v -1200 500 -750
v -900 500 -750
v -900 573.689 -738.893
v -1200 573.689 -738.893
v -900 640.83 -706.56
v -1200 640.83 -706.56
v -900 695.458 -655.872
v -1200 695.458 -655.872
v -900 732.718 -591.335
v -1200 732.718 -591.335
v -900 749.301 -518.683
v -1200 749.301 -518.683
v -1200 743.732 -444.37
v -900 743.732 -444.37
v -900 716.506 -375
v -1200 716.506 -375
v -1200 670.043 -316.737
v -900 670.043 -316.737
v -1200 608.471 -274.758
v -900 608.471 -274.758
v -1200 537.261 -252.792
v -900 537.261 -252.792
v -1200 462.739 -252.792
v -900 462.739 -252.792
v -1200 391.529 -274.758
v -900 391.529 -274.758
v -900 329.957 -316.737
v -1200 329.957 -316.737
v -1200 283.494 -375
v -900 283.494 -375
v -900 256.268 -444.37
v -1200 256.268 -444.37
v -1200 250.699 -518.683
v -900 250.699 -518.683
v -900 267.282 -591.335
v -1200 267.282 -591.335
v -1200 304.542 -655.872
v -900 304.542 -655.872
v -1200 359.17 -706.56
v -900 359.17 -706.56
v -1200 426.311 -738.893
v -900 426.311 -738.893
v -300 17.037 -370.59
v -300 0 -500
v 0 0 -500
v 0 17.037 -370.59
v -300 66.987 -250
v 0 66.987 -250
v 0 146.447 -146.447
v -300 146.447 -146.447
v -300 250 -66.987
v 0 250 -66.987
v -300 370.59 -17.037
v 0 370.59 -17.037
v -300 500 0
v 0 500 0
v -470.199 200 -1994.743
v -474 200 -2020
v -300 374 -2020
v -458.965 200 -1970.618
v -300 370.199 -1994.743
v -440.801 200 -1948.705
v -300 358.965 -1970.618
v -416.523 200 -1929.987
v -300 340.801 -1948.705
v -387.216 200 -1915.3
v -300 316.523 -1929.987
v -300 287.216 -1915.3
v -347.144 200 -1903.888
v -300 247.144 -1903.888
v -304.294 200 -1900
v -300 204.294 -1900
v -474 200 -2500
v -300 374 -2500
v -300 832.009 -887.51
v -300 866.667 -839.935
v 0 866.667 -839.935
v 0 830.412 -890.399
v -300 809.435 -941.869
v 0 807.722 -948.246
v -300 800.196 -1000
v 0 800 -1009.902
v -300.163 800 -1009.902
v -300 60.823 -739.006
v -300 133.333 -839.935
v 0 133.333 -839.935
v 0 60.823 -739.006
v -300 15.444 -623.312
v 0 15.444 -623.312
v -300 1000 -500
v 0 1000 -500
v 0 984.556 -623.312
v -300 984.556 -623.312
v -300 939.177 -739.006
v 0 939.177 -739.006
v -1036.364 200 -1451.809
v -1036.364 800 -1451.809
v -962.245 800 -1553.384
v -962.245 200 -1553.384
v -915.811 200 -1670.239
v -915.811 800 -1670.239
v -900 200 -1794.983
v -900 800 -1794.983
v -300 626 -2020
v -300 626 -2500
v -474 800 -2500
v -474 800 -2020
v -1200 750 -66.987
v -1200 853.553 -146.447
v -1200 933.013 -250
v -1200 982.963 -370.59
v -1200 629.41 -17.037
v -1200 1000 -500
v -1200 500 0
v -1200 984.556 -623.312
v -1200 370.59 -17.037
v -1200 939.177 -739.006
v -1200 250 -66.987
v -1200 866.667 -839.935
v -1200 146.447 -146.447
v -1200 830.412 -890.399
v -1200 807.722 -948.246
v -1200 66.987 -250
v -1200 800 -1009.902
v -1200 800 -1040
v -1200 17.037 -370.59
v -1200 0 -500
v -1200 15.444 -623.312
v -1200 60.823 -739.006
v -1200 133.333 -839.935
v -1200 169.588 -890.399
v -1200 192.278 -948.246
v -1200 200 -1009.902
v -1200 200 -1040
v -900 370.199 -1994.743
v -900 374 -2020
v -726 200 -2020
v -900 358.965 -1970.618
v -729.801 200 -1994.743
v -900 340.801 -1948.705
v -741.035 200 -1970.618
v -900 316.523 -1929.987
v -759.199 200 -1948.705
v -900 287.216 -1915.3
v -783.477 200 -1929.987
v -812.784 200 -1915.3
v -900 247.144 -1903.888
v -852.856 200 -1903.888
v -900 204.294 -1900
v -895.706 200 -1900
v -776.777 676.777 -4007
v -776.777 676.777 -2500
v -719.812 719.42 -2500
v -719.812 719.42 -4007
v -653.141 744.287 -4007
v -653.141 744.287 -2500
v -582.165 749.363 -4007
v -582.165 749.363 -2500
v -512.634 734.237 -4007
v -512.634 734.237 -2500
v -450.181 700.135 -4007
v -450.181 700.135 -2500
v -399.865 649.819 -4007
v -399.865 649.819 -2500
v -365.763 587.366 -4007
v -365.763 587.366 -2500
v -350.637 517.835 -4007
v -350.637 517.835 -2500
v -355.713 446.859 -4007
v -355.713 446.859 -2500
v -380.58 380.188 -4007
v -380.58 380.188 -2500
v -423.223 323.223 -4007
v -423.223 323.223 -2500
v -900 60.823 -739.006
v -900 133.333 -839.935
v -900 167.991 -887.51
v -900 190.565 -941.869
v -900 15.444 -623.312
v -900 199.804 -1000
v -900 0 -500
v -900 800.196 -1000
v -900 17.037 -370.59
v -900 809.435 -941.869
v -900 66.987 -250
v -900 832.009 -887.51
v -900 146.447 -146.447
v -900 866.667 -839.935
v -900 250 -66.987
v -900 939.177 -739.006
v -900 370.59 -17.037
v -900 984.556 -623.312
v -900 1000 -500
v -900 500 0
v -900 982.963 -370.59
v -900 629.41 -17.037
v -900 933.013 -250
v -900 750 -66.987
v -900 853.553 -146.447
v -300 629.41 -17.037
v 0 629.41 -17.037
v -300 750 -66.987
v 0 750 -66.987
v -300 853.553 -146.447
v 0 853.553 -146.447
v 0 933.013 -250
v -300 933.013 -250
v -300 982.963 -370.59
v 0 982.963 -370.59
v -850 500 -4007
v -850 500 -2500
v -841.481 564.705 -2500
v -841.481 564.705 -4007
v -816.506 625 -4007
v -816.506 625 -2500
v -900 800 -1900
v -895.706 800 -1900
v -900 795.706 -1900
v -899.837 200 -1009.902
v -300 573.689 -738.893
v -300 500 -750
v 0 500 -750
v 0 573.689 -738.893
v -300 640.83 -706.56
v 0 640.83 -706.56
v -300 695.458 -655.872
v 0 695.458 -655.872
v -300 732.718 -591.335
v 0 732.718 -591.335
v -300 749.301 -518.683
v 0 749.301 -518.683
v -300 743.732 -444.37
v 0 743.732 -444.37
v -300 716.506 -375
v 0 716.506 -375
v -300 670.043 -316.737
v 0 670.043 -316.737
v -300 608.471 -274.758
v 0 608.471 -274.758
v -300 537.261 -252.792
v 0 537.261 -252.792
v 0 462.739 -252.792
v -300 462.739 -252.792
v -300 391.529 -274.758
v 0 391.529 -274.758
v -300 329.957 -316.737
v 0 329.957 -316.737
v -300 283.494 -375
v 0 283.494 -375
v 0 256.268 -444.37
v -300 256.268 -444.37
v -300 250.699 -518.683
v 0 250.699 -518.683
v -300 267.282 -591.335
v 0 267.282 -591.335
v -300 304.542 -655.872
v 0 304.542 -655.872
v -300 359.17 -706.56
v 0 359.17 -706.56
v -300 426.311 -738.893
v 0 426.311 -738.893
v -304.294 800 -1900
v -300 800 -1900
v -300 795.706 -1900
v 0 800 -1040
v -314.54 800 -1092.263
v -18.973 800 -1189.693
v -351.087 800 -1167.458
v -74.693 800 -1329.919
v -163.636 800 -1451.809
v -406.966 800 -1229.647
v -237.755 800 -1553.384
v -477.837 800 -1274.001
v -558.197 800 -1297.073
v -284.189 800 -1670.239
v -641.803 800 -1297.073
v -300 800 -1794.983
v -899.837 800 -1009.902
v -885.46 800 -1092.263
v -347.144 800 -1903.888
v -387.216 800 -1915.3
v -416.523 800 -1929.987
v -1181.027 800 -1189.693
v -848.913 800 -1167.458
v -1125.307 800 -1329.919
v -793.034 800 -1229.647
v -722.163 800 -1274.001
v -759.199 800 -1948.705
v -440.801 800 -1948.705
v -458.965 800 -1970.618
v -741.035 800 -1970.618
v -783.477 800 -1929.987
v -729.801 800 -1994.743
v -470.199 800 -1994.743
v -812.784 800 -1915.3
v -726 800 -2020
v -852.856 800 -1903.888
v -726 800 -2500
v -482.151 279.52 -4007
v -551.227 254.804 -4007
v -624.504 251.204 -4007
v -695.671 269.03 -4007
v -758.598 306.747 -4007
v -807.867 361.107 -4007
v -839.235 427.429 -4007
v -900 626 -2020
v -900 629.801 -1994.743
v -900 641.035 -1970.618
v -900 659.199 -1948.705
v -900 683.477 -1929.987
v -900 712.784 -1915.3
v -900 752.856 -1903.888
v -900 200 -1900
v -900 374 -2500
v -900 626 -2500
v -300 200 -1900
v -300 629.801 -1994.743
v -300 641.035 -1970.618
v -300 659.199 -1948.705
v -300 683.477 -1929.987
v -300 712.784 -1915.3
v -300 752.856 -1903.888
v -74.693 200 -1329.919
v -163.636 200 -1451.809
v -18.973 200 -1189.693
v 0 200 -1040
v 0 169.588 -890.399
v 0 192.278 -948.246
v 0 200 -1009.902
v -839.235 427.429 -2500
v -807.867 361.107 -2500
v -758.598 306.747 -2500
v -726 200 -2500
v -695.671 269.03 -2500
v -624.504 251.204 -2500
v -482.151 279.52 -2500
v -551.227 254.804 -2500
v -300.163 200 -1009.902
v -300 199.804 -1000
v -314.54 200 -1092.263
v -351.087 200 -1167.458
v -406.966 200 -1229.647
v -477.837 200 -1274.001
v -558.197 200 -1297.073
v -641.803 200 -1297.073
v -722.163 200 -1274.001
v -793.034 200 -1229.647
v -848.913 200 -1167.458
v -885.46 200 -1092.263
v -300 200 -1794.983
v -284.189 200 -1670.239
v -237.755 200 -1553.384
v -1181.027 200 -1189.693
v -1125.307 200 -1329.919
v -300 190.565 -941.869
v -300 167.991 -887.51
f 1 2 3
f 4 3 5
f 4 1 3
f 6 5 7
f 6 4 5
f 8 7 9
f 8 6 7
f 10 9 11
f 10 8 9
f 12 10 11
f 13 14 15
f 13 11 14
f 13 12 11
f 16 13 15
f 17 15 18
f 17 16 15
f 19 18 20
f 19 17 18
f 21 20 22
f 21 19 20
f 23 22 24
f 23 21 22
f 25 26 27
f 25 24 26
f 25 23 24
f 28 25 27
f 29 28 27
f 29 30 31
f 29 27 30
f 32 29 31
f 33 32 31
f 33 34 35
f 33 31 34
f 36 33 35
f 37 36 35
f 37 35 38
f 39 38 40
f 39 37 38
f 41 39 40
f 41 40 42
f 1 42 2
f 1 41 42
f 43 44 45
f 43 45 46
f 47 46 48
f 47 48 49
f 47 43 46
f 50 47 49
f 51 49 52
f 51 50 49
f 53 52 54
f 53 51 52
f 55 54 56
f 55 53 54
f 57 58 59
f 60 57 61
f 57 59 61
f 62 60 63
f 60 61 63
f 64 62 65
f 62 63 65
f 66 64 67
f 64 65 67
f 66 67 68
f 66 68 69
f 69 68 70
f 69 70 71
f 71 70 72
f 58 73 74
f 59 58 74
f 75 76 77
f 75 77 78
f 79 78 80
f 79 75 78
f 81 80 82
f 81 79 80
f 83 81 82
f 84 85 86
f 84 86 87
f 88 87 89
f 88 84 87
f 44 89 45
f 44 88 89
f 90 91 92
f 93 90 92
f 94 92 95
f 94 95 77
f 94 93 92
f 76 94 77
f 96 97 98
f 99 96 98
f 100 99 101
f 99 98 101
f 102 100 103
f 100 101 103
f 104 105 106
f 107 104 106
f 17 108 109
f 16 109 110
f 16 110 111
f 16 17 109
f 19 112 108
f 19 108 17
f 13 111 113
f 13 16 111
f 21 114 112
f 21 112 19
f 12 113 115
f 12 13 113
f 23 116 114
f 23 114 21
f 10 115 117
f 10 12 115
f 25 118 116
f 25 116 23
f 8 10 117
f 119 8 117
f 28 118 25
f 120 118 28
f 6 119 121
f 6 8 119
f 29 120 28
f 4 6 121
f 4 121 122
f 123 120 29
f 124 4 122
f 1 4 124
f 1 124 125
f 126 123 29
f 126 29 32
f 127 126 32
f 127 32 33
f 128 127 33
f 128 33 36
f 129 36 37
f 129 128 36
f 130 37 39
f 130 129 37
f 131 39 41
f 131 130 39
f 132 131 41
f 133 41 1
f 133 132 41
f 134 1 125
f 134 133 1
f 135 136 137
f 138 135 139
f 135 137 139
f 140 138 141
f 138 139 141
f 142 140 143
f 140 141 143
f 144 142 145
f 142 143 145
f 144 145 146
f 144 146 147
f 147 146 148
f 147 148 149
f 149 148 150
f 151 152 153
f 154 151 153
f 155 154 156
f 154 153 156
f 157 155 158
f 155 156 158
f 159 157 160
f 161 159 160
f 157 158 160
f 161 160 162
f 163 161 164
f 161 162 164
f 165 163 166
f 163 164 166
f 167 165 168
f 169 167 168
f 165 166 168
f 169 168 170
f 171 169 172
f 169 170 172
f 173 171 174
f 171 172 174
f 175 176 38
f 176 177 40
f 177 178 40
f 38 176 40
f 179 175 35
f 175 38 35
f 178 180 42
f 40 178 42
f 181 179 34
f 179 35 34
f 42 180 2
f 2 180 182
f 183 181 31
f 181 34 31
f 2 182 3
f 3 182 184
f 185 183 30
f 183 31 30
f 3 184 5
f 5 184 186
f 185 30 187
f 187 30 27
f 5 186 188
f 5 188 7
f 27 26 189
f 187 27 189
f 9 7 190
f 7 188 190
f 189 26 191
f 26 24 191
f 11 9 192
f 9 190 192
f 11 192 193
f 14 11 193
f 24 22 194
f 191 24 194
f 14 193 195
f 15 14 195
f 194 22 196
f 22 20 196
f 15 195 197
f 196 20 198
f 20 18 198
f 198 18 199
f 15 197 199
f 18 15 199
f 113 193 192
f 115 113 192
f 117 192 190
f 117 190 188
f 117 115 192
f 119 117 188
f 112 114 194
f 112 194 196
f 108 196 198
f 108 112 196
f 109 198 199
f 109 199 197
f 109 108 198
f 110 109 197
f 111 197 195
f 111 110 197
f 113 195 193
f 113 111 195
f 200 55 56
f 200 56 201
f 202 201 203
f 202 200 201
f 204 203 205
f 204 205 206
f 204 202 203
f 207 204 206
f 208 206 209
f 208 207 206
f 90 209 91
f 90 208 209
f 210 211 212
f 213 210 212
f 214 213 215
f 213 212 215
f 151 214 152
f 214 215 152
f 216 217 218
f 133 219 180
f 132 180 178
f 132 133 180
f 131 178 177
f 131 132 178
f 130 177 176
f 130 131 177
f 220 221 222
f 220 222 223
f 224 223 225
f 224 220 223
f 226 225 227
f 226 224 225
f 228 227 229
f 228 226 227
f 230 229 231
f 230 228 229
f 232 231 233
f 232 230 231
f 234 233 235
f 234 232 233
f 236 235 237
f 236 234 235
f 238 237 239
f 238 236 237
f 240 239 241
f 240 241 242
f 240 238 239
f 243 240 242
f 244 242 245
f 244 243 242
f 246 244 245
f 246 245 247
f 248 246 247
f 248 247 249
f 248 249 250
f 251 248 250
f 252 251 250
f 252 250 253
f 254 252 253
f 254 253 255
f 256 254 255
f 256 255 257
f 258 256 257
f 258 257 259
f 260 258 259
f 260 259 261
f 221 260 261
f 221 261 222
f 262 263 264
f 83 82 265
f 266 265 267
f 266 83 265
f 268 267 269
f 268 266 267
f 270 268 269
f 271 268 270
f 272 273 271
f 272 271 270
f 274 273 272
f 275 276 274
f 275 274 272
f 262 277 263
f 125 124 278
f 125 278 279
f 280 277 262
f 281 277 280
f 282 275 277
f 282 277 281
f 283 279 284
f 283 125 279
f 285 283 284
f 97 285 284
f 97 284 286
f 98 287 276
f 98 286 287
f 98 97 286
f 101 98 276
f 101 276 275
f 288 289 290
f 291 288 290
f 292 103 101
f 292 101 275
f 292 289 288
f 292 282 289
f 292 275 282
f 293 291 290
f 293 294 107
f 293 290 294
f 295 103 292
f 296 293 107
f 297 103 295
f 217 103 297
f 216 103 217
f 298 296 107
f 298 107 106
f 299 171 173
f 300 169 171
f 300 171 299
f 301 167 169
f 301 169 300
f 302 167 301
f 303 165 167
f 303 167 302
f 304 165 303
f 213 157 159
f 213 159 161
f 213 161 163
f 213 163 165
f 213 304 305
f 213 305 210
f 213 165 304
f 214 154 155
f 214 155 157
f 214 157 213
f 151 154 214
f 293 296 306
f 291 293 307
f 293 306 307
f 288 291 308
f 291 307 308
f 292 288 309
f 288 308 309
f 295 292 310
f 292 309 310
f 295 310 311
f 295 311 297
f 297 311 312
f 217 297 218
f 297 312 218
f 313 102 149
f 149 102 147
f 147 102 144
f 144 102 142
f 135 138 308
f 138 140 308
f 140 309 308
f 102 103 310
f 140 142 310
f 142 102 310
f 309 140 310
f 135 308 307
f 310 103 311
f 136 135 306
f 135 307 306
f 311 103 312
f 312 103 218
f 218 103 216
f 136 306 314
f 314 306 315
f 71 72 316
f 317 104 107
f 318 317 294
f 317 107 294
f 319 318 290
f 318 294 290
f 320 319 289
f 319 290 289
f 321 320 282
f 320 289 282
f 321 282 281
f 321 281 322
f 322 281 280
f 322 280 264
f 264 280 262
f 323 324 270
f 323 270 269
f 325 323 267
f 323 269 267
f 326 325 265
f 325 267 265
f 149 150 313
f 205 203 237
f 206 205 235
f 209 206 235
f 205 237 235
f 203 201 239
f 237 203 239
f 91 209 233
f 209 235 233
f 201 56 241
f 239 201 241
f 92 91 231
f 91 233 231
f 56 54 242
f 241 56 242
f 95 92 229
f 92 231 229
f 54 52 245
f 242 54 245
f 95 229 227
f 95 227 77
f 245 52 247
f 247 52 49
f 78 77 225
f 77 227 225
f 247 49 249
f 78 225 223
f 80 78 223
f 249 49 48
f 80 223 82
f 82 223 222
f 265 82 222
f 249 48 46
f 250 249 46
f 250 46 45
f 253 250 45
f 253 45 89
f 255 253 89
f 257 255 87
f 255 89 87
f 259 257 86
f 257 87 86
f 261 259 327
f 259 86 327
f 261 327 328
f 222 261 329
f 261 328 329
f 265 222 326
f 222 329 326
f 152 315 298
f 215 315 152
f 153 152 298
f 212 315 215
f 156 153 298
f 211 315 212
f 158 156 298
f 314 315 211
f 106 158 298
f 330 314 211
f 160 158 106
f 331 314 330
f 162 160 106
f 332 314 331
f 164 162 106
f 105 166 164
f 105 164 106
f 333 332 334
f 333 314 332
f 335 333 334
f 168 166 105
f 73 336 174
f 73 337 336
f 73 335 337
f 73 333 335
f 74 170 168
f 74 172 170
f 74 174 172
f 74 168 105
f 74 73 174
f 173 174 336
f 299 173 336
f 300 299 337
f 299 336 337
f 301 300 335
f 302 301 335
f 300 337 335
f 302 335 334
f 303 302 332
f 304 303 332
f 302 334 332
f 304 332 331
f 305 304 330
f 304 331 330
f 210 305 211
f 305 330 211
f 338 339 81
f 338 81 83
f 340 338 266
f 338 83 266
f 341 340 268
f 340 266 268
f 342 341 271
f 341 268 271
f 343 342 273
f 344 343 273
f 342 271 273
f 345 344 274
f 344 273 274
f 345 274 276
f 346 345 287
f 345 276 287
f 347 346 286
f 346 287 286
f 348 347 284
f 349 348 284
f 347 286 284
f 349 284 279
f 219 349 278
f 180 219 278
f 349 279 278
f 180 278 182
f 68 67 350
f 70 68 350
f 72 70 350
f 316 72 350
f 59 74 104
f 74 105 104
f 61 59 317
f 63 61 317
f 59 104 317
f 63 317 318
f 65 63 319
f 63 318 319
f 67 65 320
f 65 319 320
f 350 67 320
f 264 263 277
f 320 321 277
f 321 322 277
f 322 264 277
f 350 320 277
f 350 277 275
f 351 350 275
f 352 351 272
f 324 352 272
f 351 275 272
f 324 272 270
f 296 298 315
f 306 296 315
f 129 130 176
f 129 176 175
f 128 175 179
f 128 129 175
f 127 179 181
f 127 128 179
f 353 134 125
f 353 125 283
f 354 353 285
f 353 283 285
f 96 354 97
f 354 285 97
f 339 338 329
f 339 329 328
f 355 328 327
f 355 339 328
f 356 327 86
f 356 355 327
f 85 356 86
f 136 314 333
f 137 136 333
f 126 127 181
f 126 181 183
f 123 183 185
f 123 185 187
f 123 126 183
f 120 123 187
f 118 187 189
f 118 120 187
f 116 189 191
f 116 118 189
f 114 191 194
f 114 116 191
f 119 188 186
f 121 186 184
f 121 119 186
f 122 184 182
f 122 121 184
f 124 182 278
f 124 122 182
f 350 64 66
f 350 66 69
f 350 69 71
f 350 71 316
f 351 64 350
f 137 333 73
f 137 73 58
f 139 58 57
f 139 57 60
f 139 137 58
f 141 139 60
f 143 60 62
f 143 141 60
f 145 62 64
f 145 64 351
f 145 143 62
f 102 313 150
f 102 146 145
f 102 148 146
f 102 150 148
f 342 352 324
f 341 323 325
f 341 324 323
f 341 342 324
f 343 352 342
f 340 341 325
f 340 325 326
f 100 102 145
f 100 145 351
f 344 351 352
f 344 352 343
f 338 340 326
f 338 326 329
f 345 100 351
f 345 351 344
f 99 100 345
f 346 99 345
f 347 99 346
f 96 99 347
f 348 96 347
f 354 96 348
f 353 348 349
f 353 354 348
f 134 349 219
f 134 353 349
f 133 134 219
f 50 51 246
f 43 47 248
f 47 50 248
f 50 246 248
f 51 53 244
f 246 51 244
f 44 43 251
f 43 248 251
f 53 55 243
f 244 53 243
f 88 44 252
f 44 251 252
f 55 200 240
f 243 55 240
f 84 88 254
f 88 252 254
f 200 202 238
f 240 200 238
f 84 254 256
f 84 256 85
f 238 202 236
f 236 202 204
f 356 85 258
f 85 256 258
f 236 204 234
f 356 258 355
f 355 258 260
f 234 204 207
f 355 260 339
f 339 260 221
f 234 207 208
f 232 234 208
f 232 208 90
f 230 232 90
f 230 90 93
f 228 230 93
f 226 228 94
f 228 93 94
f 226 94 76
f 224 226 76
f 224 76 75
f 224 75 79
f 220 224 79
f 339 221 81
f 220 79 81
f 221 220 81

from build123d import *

# Parameters (mm, degrees)
SKETCH2_W           = 1200
SKETCH2_H           = 2500
BOSS_EXTRUDE1_DEPTH = 1000
CUT_EXTRUDE4_DEPTH  = 2948.880594597
CUT_EXTRUDE5_DEPTH  = 2948.880594597
SKETCH4_R           = 250
CUT_EXTRUDE6_DEPTH  = 2948.880594597
CUT_EXTRUDE7_DEPTH  = 600
SKETCH5_3_R         = 250
BOSS_EXTRUDE2_DEPTH = 1507
FILLET2_R           = 120
FILLET3_R           = 120
FILLET4_R           = 120
FILLET5_R           = 120


with BuildPart() as part:
    # Sketch2 → Boss-Extrude1 (new body)
    with BuildSketch(Plane(origin=(0, 0, 0), x_dir=(1, 0, 0), z_dir=(0, 1, 0))):
        with Locations((-600, 1250)):
            Rectangle(SKETCH2_W, SKETCH2_H)
    extrude(amount=BOSS_EXTRUDE1_DEPTH)

    # Sketch3 → Cut-Extrude4 (cut, through all)
    with BuildSketch(Plane(origin=(0, 1000, 0), x_dir=(1, 0, 0), z_dir=(0, 1, 0))):
        with BuildLine():
            Line((-900, 1794.983443527), (-900, 2500))
            Line((-900, 2500), (-1200, 2500))
            Line((-1200, 2500), (-1200, 1040))
            ThreePointArc((-1200, 1040), (-1157.592226371, 1261.564683763), (-1036.363636364, 1451.809151015))
            ThreePointArc((-1036.363636364, 1451.809151015), (-935.339811358, 1610.346207058), (-900, 1794.983443527))
        make_face()
        with BuildLine():
            Line((0, 2500), (-300, 2500))
            Line((-300, 2500), (-300, 1794.983443527))
            ThreePointArc((-300, 1794.983443527), (-264.660188642, 1610.346207058), (-163.636363636, 1451.809151015))
            ThreePointArc((-163.636363636, 1451.809151015), (-42.407773629, 1261.564683763), (0, 1040))
            Line((0, 1040), (0, 2500))
        make_face()
    extrude(amount=-CUT_EXTRUDE4_DEPTH, mode=Mode.SUBTRACT)

    # Sketch3<4> → Cut-Extrude5 (cut, through all)
    with BuildSketch(Plane(origin=(0, 1000, 0), x_dir=(1, 0, 0), z_dir=(0, 1, 0))):
        with BuildLine():
            ThreePointArc((-300, 1000), (-600, 1300), (-900, 1000))
            Line((-900, 1000), (-900, 0))
            Line((-900, 0), (-300, 0))
            Line((-300, 0), (-300, 1000))
        make_face()
    extrude(amount=-CUT_EXTRUDE5_DEPTH, mode=Mode.SUBTRACT)

    # Sketch4 → Cut-Extrude6 (cut, through all)
    with BuildSketch(Plane(origin=(0, 0, 0), x_dir=(0, 0, -1), z_dir=(1, 0, 0))):
        with BuildLine():
            Line((2500, 800), (2500, 1000))
            Line((2500, 1000), (500.000001046, 1000))
            ThreePointArc((500.000001046, 1000), (682.574186322, 965.474667935), (839.93463424, 866.666666667))
            ThreePointArc((839.93463424, 866.666666667), (918.614858442, 817.262665937), (1009.901951359, 800))
            Line((1009.901951359, 800), (2500, 800))
        make_face()
        with BuildLine():
            Line((2500, 0), (2500, 200))
            Line((2500, 200), (1009.901951359, 200))
            ThreePointArc((1009.901951359, 200), (918.614858442, 182.737334063), (839.93463424, 133.333333333))
            ThreePointArc((839.93463424, 133.333333333), (682.574185835, 34.525331874), (500, 0))
            Line((500, 0), (2500, 0))
        make_face()
        with BuildLine():
            ThreePointArc((0, 500), (146.446609777, 853.553390963), (500.000001046, 1000))
            Line((500.000001046, 1000), (0, 1000))
            Line((0, 1000), (0, 500))
        make_face()
        with BuildLine():
            Line((0, 0), (500, 0))
            ThreePointArc((500, 0), (146.446609407, 146.446609407), (0, 500))
            Line((0, 500), (0, 0))
        make_face()
        with Locations((500, 500)):
            Circle(SKETCH4_R)
    extrude(amount=-CUT_EXTRUDE6_DEPTH, mode=Mode.SUBTRACT)

    # Sketch5 → Cut-Extrude7 (cut)
    with BuildSketch(Plane(origin=(0, 0, -2500), x_dir=(-1, 0, 0), z_dir=(0, 0, -1))):
        Polygon((900, 626), (900, 800), (726, 800), align=None)
        Polygon((900, 200), (900, 374), (726, 200), align=None)
        Polygon((300, 626), (474, 800), (300, 800), align=None)
        Polygon((474, 200), (300, 374), (300, 200), align=None)
    extrude(amount=-CUT_EXTRUDE7_DEPTH, mode=Mode.SUBTRACT)

    # Sketch5<3> → Boss-Extrude2 (add)
    with BuildSketch(Plane(origin=(0, 0, -2500), x_dir=(-1, 0, 0), z_dir=(0, 0, -1))):
        with Locations((600, 500)):
            Circle(SKETCH5_3_R)
    extrude(amount=BOSS_EXTRUDE2_DEPTH)

    # Fillet2
    fillet2_edges = [part.edges().sort_by_distance(p)[0] for p in [
        (-387, 713, -1900),
    ]]
    fillet(fillet2_edges, radius=FILLET2_R)

    # Fillet3
    fillet3_edges = [part.edges().sort_by_distance(p)[0] for p in [
        (-387, 287, -1900),
    ]]
    fillet(fillet3_edges, radius=FILLET3_R)

    # Fillet4
    fillet4_edges = [part.edges().sort_by_distance(p)[0] for p in [
        (-813, 713, -1900),
    ]]
    fillet(fillet4_edges, radius=FILLET4_R)

    # Fillet5
    fillet5_edges = [part.edges().sort_by_distance(p)[0] for p in [
        (-813, 287, -1900),
    ]]
    fillet(fillet5_edges, radius=FILLET5_R)


solid = part.part
